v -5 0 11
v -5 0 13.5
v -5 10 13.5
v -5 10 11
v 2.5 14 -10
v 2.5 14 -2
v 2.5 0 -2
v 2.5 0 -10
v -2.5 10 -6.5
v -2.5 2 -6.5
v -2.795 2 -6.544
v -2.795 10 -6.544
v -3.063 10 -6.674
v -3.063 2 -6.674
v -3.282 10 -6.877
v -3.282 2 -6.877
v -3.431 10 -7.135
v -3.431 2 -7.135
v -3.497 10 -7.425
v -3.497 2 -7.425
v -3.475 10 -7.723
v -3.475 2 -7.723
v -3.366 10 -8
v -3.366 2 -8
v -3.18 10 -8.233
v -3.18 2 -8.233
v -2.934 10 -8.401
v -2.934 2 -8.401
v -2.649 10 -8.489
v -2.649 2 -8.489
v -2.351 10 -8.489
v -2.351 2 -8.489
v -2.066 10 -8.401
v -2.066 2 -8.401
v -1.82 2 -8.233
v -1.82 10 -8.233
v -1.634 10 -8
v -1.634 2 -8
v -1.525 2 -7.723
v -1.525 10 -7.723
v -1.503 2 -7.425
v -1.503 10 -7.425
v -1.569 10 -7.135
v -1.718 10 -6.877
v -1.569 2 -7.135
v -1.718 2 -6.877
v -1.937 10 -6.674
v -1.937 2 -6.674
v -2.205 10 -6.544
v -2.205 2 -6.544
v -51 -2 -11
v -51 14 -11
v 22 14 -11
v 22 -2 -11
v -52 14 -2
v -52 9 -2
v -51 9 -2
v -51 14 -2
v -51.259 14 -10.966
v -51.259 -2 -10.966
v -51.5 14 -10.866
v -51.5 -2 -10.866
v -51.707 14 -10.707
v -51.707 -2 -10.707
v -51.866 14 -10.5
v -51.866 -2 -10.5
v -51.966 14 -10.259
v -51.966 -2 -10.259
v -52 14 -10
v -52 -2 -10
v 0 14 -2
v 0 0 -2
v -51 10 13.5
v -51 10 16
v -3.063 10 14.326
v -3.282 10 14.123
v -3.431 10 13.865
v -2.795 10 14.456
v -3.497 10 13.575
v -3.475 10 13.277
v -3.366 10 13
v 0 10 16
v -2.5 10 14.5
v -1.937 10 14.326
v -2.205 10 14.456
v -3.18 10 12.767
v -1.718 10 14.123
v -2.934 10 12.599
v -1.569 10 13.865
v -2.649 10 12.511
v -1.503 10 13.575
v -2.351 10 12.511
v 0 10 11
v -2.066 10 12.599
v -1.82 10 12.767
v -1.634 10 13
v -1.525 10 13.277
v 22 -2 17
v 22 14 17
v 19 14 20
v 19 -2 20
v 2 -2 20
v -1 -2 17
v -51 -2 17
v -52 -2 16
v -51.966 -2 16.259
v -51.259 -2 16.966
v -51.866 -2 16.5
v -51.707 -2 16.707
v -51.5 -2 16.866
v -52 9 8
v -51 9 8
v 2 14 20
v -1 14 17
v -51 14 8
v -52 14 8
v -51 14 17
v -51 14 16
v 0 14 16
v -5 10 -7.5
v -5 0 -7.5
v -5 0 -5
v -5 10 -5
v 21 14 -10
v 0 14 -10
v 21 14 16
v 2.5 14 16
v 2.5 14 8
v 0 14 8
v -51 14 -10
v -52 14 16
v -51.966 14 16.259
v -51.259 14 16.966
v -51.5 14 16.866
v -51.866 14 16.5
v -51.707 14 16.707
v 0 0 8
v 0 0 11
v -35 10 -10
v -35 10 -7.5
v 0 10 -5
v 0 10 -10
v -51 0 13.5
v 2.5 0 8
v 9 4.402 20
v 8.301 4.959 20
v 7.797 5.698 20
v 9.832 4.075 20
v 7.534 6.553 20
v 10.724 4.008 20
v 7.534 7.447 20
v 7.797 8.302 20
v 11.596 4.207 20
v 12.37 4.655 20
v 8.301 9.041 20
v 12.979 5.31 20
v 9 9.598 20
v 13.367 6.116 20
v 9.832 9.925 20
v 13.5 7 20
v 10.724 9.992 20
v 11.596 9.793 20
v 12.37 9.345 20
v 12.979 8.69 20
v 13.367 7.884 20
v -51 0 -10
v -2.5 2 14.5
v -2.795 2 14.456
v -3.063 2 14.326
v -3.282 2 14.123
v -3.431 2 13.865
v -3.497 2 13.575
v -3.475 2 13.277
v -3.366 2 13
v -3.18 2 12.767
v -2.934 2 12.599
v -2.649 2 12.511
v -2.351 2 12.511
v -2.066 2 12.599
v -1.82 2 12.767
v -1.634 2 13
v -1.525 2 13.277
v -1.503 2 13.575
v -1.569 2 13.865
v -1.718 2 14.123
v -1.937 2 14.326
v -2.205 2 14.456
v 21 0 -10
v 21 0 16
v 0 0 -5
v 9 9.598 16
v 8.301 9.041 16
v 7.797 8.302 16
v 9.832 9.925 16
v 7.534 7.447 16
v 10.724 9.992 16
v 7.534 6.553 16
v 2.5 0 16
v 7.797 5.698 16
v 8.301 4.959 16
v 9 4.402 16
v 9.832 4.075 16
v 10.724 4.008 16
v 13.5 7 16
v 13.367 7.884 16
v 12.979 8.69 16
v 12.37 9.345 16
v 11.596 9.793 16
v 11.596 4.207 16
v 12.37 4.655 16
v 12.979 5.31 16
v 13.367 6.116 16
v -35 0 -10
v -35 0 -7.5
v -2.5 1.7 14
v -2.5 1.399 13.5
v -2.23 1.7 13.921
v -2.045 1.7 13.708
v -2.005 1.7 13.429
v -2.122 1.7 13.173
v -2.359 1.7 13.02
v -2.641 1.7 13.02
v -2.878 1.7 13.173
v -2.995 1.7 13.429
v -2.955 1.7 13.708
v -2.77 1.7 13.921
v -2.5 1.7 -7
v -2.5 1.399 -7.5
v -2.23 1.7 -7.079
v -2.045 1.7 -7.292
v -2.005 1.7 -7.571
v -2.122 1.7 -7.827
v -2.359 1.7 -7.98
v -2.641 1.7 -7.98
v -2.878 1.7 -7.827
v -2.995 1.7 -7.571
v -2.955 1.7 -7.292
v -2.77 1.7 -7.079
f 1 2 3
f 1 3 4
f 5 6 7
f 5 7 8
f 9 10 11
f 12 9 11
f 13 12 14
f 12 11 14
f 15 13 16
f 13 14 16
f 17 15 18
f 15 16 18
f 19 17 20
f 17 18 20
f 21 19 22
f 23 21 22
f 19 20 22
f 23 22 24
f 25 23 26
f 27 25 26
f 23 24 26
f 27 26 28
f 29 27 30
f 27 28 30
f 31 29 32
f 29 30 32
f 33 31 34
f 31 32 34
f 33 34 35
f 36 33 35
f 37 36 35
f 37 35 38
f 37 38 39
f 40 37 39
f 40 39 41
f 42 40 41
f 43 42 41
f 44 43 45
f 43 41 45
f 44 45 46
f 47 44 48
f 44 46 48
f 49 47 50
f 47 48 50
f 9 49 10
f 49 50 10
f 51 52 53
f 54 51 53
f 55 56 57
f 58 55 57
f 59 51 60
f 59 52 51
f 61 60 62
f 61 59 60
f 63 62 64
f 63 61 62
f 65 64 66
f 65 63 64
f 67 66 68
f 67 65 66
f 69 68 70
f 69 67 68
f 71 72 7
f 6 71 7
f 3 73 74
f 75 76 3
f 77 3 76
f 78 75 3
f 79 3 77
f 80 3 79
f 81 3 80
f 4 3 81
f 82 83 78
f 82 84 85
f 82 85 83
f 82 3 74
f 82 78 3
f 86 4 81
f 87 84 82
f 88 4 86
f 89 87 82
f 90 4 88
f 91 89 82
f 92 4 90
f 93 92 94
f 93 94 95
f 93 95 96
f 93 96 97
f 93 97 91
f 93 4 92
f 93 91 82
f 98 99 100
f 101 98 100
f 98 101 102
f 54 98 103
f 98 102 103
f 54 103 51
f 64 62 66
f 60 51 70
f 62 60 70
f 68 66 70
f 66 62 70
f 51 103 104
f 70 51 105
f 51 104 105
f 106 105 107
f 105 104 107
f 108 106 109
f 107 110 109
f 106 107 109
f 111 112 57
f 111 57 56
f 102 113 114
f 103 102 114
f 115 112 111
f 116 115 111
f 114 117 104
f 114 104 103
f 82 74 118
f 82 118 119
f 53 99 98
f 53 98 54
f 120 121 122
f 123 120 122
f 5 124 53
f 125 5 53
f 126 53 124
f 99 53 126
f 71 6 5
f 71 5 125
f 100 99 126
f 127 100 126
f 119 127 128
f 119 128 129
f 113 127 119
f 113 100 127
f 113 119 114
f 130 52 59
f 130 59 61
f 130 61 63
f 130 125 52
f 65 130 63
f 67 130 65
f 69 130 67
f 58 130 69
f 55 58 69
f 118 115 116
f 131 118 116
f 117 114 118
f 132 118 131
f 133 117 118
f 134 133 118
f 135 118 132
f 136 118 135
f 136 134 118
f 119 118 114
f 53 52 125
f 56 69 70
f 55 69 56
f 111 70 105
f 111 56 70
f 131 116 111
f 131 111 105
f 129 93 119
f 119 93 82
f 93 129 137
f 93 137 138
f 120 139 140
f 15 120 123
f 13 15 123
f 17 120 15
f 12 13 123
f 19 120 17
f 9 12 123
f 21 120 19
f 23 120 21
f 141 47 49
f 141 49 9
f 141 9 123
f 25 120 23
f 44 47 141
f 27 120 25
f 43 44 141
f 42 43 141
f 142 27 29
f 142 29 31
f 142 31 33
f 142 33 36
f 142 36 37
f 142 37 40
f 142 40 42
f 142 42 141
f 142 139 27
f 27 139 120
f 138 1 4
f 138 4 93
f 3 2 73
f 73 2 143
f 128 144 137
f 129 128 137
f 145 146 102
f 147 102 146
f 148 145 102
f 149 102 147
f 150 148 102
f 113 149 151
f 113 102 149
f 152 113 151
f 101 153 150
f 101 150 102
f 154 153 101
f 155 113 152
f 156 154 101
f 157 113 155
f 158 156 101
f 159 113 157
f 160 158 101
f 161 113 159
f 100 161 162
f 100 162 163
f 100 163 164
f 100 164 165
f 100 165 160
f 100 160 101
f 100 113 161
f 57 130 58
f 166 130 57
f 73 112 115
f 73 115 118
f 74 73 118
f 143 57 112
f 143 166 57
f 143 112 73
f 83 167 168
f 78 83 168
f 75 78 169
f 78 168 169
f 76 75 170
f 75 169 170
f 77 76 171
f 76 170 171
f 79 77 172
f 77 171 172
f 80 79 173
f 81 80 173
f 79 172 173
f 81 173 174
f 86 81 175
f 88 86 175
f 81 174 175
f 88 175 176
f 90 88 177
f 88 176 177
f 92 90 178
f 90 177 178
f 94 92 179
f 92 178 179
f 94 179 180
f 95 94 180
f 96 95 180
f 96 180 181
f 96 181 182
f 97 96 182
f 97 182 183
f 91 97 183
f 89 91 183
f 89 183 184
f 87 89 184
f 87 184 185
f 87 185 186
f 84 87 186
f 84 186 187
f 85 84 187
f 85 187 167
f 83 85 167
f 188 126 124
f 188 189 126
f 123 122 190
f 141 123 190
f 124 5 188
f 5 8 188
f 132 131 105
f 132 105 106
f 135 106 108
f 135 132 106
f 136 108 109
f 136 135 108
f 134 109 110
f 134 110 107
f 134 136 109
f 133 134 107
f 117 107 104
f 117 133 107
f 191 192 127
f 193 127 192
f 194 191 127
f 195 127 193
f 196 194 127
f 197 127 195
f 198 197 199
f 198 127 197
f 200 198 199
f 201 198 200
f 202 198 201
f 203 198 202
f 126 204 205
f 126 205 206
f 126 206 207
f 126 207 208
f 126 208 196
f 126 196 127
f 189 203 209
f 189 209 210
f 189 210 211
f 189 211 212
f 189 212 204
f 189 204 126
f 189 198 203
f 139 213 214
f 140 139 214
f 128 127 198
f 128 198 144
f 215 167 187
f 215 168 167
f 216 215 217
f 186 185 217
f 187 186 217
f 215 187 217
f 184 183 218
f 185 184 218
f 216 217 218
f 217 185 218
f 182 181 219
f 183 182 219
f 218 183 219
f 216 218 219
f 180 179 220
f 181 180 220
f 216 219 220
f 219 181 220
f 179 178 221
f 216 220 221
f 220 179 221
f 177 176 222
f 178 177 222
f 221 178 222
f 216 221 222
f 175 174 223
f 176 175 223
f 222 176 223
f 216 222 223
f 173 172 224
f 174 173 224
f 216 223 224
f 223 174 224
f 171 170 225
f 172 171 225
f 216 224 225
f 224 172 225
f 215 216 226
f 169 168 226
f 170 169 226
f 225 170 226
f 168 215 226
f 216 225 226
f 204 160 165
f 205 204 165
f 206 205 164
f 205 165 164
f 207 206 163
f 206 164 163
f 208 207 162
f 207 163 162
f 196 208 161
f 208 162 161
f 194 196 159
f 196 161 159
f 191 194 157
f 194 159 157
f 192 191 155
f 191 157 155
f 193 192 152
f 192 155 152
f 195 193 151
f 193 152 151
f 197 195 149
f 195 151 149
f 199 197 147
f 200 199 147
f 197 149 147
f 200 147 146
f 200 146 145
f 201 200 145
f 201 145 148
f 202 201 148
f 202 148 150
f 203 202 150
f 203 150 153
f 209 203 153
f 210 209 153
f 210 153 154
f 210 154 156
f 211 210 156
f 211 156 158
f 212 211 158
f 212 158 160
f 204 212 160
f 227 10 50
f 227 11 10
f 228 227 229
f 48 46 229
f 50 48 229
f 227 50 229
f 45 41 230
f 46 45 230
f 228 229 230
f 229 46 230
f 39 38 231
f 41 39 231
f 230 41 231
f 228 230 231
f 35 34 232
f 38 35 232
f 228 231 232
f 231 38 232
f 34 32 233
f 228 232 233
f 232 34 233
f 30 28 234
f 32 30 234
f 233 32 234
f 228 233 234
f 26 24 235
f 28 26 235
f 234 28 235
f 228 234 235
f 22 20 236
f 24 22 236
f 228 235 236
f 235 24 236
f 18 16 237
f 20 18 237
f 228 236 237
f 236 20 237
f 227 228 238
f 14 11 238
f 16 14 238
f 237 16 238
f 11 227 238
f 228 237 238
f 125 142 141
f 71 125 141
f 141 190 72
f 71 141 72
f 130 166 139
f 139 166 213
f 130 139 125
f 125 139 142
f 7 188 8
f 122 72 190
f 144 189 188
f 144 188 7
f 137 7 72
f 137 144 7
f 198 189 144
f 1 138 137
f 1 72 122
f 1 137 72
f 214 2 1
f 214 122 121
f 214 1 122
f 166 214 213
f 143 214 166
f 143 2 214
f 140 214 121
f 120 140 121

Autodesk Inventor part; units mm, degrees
ref_plane "YZ Plane" through (0, 0, 0) normal (1, 0, 0) x (0, 1, 0)
ref_plane "XZ Plane" through (0, 0, 0) normal (0, 1, 0) x (-1, 0, 0)
ref_plane "XY Plane" through (0, 0, 0) normal (0, 0, 1) x (1, 0, 0)
sketch "Sketch1" plane through (0, 0, 0) normal (0, 1, 0) x (-1, 0, 0)
  line L0 (52, -10) -> (52, 16)
  arc A0 (52, 16) -> (51, 17) centre (51, 16) ccw
  line L1 (51, 17) -> (-22, 17)
  arc A1 (50, -10) -> (51, -9) centre (51, -10) ccw
  line L2 (-22, 17) -> (-22, -11)
  line L3 (-2, 20) -> (-19, 20)
  line L4 (-1, 5) -> (-1, 14)
  line L5 (0, 14) -> (0, 5)
  line L6 (-1, 1) -> (-1, -8)
  line L7 (51, 16) -> (-21, 16)
  line L8 (51, -2) -> (51, 8)
  line L9 (52, 8) -> (52, -2)
  line L10 (51, -10) -> (-21, -10)
  line L11 (51, 8) -> (52, 8)
  line L12 (52, 8) -> (52, -2)
  line L13 (52, -2) -> (51, -2)
  line L14 (51, -2) -> (51, 8)
  line L15 (51, -10) -> (51, 16)
  line L16 (52, 16) -> (52, -10)
  line L17 (51, -11) -> (-22, -11)
  line L18 (-21, 16) -> (-21, -10)
  line L19 (-2, 20) -> (1, 17)
  line L20 (-2, 20) -> (2.6568, 20) construction
  line L21 (-22, 17) -> (-19, 20)
  line L22 (-22, 17) -> (-5.0328, 17) construction
  line L23 (-1, 1) -> (0.3284, 1)
  line L24 (0.3284, 1) -> (0.3284, -8)
  line L25 (0.3284, -8) -> (-1, -8)
  line L26 (-1, -8) -> (-1, 1)
  line L27 (-1, 14) -> (0, 14)
  line L28 (0, 14) -> (0, 5)
  line L29 (0, 5) -> (-1, 5)
  line L30 (-1, 5) -> (-1, 14)
  point P0 (0, 0)
  dimension "d0" = 45
  dimension "d1" = 45
extrude "Extrusion1" add sketch "Sketch1" against normal blind 2 contours A1 L15 L13 L0 | A1 L10 L15 | L13 L8 L11 L0 | L17 L2 L1 A0 L0 L11 L15 L7 L18 L10 A1 | L15 L10 L18 L7 L8 | L21 L3 L19 L1 | L4 L27 L5 L29 | L23 L24 L25 L6
extrude "Extrusion2" add sketch "Sketch1" along normal blind 9 contours A1 L15 L13 L0 | A1 L10 L15 | L13 L8 L11 L0 | L17 L2 L1 A0 L0 L11 L15 L7 L18 L10 A1 | L21 L3 L19 L1
extrude "Extrusion3" add sketch "Sketch1" along normal blind 14 contours A1 L15 L13 L0 | A1 L10 L15 | L17 L2 L1 A0 L0 L11 L15 L7 L18 L10 A1 | L21 L3 L19 L1
sketch "Sketch2" plane through (0, 0, 0) normal (0, 1, 0) x (1, 0, 0)
  line L0 (-51, 10) -> (21, 10) projected
  line L1 (21, -16) -> (-51, -16) projected
  line L2 (21, 10) -> (-51, 10) projected
  line L3 (0, -16) -> (-5, -16)
  line L4 (-5, -16) -> (-5, -11)
  line L5 (-5, -11) -> (0, -11)
  line L6 (0, -11) -> (0, -16)
  line L7 (0, 10) -> (-5, 10)
  line L8 (-5, 10) -> (-5, 5)
  line L9 (-5, 5) -> (0, 5)
  line L10 (0, 5) -> (0, 10)
  line L11 (-5, 10) -> (-35, 10)
  line L12 (-35, 10) -> (-35, 7.5)
  line L13 (-35, 7.5) -> (-5, 7.5)
  line L14 (-5, 7.5) -> (-5, 10)
  line L15 (-51, 2) -> (-51, 10) projected
  line L16 (-5, -13.5) -> (-51, -13.5)
  line L17 (-51, -13.5) -> (-51, -16)
  line L18 (-51, -16) -> (-5, -16)
  line L19 (-5, -16) -> (-5, -13.5)
  point P0 (0, 0)
  dimension "d8" = 5
  dimension "d9" = 5
  dimension "d10" = 5
  dimension "d11" = 5
  dimension "d12" = 16
extrude "Extrusion4" add sketch "Sketch2" along normal blind 10
sketch "Sketch3" plane through (2, -2, 20) normal (0, 0, 1) x (1, 0, 0)
  line L0 (17, 0) -> (17, 16) projected
  line L1 (0, 16) -> (17, 2)
  circle A0 centre (8.5, 9) radius 3
  point P0 (-2, 2)
  dimension "d15" = 6
sketch "Sketch4" plane through (0, 0, 0) normal (0, 1, 0) x (1, 0, 0)
  line L0 (0, -16) -> (21, -16) projected
  line L1 (-51, 10) -> (21, 10) projected
  line L2 (0, -16) -> (2.5, -16)
  line L3 (2.5, -16) -> (2.5, 10)
  line L4 (2.5, 10) -> (0, 10)
  line L5 (0, 10) -> (0, -16)
  line L6 (2.5, -8) -> (0, -8)
  line L7 (0, -8) -> (0, 2)
  line L8 (0, 2) -> (2.5, 2)
  line L9 (2.5, 2) -> (2.5, -8)
  line L10 (2.5, 2) -> (0, 2)
  line L11 (0, 2) -> (0, 10)
  line L12 (0, 10) -> (2.5, 10)
  line L13 (2.5, 10) -> (2.5, 2)
  line L14 (0, -8) -> (2.5, -8)
  line L15 (2.5, -8) -> (2.5, -16)
  line L16 (2.5, -16) -> (0, -16)
  line L17 (0, -16) -> (0, -8)
  point P0 (0, 0)
  dimension "d16" = 2.5
  dimension "d17" = 8
  dimension "d18" = 8
extrude "Extrusion5" add sketch "Sketch4" along normal blind 14 contours L5 L6 L3 L0 | L5 L1 L3 L8
extrude "Extrusion6" cut sketch "Sketch3" against normal blind 14
sketch "Sketch5" plane through (0, 10, 0) normal (0, 1, 0) x (1, 0, 0)
  line L0 (-35, 10) -> (0, 10) projected
  line L1 (-35, 10) -> (-35, 7.5) projected
  line L2 (-35, 7.5) -> (-5, 7.5) projected
  line L3 (-5, 7.5) -> (-5, 5) projected
  line L4 (-5, 5) -> (0, 5) projected
  line L5 (0, 5) -> (0, 10) projected
  line L6 (0, -16) -> (-51, -16) projected
  line L7 (0, -16) -> (0, -11) projected
  line L8 (0, -11) -> (-5, -11) projected
  line L9 (-5, -11) -> (-5, -13.5) projected
  line L10 (-5, -13.5) -> (-51, -13.5) projected
  line L11 (-51, -16) -> (-51, -13.5) projected
  line L12 (-5, -11) -> (0, -16)
  line L13 (0, 5) -> (0, 10) projected
  line L14 (0, 10) -> (-5, 5)
  point P0 (0, 0)
  point P1 (-2.5, 7.5)
  point P2 (-2.5, -13.5)
hole "Hole1" at (-2.5, 10, -7.5) at (-2.5, 10, 13.5) direction (0, -1, 0) diameter 2 depth 8 tip angle 118
properties part number "ttgo_lora_oled_case"
